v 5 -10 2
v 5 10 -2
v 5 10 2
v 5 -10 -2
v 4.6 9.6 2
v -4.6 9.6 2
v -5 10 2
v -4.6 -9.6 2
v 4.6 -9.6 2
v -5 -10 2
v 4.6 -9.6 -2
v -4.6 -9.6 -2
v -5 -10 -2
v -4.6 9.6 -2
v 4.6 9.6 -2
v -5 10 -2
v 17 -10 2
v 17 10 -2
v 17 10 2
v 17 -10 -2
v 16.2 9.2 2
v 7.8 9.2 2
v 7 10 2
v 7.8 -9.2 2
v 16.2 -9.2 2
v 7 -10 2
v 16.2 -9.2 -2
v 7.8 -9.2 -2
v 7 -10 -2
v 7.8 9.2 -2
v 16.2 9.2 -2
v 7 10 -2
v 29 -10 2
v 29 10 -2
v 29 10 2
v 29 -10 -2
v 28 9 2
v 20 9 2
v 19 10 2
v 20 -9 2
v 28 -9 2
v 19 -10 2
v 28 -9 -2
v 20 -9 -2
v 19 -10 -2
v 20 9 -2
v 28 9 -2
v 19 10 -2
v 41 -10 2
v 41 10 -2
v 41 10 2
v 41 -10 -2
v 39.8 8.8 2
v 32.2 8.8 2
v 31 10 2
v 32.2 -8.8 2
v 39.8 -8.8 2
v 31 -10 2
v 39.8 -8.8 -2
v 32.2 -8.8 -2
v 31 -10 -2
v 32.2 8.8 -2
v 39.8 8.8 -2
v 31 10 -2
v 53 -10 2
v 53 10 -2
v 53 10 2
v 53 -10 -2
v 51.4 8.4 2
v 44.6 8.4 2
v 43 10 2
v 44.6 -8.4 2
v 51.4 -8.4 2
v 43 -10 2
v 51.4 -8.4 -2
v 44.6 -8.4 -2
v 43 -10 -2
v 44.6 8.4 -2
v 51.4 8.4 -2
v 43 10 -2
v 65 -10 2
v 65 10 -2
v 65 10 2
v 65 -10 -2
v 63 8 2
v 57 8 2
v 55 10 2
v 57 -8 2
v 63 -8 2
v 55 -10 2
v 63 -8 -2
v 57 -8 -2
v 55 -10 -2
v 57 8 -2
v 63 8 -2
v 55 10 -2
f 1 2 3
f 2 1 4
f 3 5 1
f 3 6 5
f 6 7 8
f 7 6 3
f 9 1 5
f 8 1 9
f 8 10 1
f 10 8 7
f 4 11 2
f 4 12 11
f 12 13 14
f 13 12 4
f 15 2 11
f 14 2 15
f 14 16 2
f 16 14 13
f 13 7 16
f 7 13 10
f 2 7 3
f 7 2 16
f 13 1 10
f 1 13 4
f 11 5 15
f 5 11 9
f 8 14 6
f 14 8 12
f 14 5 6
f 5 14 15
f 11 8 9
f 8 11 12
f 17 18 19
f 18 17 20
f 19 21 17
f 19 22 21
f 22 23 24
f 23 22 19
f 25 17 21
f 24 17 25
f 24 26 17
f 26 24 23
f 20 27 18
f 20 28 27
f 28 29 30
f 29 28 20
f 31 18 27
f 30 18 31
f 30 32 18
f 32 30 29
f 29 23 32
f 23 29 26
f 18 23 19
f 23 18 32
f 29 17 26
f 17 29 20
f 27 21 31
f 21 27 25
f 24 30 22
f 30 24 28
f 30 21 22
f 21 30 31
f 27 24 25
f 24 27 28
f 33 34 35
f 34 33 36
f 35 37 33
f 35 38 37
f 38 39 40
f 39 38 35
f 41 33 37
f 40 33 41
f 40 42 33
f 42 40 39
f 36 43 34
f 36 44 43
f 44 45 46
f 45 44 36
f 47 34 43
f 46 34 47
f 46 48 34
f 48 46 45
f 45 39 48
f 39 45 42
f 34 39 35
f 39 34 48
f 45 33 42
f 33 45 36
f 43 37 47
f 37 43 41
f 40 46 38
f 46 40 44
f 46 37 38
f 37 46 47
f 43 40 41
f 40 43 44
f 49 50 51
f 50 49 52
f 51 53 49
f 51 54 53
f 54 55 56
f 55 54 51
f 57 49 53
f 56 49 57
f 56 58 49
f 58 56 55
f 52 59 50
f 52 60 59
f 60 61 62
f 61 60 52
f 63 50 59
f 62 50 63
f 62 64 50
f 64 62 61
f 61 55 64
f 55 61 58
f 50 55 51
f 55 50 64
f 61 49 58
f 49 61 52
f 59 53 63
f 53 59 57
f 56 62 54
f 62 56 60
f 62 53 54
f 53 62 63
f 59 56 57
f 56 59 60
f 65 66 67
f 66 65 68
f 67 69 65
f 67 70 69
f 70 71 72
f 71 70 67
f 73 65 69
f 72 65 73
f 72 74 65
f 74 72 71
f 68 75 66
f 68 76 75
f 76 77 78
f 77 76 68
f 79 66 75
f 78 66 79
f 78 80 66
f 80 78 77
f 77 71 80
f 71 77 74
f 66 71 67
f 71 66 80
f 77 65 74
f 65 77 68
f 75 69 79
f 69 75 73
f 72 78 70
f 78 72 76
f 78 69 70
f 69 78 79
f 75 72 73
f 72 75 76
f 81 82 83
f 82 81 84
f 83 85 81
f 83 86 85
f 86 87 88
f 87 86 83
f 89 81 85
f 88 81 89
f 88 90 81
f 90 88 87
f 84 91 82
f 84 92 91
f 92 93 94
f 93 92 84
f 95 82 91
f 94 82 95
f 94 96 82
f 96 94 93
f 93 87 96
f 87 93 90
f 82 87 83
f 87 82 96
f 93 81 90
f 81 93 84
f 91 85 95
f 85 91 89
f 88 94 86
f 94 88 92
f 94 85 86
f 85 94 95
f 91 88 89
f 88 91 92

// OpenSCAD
/// @author = Iulian Arcus
/// Script to generate test samples with different wall thicknesses

wallSizes = [0.4,0.8,1.0,1.2,1.6,2.0];

width = 10;
length = 20;
height = 4;

module MakeTestCube(wallWidth= 0.4,x=10,y=5, z=3) 
difference()
{
    cube([x,y,z],center=true);
    cube([(x-(wallWidth*2)),(y-(wallWidth*2)),(z+0.1)],center=true);
}

for (index = [0:len(wallSizes)-1])
{
    translate([(width + 2)*index,0,0])
    {
        MakeTestCube(wallSizes[index],width,length,height);
    }
}    
